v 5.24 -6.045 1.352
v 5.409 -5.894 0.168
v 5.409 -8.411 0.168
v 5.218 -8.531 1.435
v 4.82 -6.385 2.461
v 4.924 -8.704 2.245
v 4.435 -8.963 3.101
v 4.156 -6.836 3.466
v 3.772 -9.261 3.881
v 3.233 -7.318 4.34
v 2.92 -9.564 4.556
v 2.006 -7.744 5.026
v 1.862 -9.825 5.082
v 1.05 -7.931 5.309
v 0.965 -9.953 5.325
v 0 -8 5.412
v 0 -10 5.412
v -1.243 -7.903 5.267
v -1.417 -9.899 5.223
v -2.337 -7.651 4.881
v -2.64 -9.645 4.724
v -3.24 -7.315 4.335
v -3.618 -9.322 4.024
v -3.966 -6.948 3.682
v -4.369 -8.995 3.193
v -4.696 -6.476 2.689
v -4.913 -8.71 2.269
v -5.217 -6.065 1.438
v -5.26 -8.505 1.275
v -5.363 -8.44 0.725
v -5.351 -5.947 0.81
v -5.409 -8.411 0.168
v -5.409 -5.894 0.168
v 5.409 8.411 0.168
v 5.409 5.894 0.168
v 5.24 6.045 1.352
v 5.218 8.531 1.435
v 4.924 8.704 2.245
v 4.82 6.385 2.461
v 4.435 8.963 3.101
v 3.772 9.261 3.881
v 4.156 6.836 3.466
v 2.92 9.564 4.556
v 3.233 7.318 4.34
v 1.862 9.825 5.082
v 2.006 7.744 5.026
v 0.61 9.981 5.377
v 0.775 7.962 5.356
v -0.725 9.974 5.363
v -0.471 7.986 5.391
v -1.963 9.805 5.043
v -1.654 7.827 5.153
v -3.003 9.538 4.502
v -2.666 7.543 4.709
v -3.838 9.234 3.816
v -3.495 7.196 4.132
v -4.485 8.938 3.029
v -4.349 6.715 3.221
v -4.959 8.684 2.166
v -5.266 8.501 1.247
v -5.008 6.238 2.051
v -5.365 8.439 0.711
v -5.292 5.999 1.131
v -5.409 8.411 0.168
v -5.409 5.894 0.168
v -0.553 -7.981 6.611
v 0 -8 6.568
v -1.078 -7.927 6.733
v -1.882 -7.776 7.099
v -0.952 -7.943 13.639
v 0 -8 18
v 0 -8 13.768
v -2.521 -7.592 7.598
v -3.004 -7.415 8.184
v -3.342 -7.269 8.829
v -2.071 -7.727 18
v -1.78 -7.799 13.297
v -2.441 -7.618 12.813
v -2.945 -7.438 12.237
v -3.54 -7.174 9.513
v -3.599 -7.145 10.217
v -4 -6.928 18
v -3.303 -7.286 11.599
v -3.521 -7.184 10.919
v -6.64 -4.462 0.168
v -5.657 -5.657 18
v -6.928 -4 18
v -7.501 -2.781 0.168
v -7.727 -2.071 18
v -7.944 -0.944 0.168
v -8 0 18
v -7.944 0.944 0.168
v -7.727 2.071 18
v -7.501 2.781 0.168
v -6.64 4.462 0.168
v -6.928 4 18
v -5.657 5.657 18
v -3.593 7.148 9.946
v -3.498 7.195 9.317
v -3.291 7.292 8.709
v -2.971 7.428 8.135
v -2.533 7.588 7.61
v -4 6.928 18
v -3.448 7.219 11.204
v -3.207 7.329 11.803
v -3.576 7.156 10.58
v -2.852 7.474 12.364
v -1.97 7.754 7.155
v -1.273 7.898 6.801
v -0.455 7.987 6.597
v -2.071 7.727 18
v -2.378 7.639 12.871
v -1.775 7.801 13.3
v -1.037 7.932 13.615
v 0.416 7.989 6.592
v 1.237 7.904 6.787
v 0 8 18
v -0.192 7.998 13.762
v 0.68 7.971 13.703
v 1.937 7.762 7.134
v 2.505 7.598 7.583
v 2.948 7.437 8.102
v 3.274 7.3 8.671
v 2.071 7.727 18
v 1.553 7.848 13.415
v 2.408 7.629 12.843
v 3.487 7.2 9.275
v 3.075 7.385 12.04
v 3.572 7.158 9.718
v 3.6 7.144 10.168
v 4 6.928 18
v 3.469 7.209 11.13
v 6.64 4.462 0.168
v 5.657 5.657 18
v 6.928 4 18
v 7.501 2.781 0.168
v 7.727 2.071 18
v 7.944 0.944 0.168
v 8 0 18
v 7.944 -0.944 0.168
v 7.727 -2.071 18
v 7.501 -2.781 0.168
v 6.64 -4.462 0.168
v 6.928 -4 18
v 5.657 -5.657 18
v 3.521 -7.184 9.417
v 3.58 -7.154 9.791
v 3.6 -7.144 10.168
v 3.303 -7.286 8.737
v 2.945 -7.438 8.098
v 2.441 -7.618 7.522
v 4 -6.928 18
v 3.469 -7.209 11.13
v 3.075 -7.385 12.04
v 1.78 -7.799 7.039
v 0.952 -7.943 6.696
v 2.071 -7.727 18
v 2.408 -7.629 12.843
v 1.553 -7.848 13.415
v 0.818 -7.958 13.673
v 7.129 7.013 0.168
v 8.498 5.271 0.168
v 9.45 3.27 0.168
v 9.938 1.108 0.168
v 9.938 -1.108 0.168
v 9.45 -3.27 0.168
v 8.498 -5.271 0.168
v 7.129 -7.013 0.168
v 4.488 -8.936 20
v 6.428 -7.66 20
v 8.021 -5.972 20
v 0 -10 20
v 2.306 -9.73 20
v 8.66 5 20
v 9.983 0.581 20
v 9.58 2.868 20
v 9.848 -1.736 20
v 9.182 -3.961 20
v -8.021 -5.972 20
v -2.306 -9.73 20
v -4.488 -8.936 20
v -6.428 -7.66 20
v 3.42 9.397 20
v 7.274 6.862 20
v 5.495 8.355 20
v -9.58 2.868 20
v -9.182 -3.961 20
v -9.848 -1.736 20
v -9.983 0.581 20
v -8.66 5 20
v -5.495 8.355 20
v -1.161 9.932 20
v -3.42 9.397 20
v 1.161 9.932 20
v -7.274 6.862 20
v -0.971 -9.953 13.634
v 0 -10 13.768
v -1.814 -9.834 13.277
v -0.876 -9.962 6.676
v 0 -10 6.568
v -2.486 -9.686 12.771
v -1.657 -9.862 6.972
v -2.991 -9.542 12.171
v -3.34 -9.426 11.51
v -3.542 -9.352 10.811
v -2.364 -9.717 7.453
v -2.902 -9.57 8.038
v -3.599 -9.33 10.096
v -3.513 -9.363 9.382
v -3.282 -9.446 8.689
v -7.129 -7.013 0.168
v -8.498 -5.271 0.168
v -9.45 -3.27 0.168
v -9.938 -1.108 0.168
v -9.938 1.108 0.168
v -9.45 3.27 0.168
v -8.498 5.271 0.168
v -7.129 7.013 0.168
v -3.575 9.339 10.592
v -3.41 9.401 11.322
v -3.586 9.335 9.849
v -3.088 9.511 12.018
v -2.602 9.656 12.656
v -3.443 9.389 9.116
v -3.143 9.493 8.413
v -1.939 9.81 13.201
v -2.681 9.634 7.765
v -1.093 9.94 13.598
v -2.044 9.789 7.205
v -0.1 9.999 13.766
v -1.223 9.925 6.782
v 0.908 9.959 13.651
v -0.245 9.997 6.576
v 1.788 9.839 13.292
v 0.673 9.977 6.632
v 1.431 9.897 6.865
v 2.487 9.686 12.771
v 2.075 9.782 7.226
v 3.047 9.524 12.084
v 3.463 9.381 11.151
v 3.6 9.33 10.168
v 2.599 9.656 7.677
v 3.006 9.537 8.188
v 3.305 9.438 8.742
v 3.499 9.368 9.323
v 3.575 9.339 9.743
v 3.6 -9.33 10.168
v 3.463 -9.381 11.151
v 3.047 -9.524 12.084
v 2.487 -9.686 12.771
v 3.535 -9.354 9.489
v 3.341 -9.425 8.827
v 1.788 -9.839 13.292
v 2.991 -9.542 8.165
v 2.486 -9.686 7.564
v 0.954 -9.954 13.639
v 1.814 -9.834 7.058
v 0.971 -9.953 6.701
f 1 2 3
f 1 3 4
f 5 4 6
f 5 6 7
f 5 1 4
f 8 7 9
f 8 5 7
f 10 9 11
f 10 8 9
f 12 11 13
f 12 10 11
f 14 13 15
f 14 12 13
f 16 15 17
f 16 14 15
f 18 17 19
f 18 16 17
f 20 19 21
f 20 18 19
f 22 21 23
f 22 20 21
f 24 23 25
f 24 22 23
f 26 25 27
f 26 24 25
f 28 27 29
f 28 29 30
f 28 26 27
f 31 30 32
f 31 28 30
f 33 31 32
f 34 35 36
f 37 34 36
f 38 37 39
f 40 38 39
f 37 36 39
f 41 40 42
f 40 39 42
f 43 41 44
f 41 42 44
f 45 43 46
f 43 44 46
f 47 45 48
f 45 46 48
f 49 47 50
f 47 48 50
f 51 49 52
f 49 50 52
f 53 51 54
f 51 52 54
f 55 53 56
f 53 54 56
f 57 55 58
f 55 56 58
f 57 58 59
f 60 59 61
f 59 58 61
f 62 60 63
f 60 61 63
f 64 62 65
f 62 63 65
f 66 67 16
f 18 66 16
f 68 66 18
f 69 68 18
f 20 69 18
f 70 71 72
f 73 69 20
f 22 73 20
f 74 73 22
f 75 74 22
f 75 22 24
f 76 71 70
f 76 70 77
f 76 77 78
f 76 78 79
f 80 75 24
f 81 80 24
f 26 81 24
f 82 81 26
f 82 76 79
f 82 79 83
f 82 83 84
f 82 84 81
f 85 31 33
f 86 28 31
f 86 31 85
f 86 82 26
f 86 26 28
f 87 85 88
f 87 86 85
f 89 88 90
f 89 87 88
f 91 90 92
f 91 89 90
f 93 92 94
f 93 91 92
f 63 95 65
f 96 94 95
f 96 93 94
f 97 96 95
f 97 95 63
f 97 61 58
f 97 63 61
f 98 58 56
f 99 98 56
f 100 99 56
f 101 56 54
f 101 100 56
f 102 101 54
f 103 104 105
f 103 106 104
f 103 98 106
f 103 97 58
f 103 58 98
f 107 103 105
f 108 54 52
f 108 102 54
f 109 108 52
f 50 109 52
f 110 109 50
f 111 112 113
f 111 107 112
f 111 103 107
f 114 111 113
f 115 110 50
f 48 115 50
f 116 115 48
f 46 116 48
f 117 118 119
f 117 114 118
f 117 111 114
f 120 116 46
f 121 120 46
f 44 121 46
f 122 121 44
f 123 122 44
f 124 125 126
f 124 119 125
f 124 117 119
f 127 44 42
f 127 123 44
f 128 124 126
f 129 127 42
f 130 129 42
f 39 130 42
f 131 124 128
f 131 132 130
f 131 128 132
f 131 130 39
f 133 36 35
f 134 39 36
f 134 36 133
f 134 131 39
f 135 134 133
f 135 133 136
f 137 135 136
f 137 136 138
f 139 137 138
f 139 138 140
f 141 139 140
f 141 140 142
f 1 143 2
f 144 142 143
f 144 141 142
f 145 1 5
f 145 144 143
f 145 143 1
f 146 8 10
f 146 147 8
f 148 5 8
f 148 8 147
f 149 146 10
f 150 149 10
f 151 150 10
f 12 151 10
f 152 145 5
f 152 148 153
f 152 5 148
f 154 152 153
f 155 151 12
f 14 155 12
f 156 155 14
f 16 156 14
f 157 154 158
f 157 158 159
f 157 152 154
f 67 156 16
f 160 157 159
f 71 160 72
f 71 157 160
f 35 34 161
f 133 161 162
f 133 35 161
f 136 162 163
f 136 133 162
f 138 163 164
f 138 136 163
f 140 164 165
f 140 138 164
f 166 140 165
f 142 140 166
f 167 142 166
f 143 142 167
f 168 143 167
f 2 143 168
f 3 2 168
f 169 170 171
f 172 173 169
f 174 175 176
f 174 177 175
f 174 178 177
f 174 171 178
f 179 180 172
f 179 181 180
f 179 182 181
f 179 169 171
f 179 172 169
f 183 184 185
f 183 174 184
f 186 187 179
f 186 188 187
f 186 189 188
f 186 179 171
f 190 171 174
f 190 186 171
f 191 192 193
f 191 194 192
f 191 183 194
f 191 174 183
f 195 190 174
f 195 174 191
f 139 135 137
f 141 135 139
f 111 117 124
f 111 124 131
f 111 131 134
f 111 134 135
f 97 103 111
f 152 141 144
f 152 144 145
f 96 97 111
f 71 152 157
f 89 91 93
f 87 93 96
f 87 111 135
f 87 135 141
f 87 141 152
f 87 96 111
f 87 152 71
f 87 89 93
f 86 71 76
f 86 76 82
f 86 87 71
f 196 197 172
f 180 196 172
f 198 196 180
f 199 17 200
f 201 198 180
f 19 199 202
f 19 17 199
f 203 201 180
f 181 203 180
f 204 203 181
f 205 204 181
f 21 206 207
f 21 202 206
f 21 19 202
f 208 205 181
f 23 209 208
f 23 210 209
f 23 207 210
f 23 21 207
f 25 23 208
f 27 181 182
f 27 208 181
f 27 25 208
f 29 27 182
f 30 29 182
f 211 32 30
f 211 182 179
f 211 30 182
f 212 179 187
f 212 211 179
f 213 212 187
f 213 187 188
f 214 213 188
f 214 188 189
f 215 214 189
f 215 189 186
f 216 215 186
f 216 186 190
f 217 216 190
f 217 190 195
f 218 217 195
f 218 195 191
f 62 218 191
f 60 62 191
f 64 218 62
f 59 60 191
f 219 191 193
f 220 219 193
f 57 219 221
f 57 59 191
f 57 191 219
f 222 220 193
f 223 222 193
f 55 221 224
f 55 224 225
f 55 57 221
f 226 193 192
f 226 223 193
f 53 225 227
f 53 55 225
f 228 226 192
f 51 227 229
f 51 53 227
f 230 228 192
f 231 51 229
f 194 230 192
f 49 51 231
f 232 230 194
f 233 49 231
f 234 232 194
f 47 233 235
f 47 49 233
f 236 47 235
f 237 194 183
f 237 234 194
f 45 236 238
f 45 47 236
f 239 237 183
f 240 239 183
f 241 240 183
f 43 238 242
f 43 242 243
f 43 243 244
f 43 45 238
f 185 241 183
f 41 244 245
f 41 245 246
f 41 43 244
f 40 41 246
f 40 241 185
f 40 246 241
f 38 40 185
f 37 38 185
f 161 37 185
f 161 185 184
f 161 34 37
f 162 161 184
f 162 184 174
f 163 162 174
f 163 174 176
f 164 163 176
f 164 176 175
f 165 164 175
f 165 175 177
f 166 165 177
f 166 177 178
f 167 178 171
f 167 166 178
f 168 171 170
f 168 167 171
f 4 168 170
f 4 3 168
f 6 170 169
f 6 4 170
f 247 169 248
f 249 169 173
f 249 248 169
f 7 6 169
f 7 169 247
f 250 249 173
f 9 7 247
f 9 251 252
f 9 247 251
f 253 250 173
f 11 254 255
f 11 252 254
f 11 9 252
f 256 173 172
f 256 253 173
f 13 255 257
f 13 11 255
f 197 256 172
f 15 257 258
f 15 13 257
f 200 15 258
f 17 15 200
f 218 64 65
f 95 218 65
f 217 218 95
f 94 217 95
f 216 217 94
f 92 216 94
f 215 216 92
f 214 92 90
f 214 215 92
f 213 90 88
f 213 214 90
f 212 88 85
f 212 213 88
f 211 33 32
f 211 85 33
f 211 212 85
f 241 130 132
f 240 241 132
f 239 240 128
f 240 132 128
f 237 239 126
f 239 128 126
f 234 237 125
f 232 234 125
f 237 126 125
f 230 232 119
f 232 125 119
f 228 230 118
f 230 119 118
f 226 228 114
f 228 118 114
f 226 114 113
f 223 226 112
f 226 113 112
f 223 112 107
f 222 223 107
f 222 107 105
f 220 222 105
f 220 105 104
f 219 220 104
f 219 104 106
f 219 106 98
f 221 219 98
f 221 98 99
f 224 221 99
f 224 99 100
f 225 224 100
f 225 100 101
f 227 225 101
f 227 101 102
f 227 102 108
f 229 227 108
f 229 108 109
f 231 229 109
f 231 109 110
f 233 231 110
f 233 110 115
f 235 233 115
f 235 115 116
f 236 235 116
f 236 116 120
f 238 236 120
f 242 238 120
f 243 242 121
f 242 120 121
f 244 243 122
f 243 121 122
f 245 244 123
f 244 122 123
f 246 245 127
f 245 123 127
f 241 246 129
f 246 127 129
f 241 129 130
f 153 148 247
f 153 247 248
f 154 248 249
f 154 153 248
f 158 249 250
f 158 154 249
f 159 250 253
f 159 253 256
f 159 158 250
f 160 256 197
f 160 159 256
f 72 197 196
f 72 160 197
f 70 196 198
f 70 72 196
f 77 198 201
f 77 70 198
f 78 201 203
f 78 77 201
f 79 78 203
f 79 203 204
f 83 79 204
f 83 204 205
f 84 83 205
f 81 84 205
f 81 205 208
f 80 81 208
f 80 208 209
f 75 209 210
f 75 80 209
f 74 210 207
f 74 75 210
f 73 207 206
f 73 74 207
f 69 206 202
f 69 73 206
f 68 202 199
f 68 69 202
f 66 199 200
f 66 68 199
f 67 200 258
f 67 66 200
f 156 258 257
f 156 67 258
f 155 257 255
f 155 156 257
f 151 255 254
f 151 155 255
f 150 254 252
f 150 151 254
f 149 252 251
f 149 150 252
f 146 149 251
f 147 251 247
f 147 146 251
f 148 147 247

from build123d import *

# Parameters (mm, degrees)
F3_R          = 3.599766951
F4_DEPTH      = 10.001
F4_DEPTH_BACK = 10.001
F6_DEPTH      = 10.0010001
F6_DEPTH_BACK = 10.0010001


with BuildPart() as f2:
    # F0 (on Right) → F2 (revolve)
    with BuildSketch(Plane.YZ):
        Polygon((0, 18), (0, 20), (-10, 20), (-10, 0.1677852448), (-8, 0.1677852448), (-8, 18), align=None)
    revolve(axis=Axis((0, 0, 9.9367983639), (0, 0, -1)))

    # F3 (on Front) → F4 (cut, two sides)
    with BuildSketch(Plane.XZ) as f4_sk:
        with Locations((0, 10.1677852448)):
            Circle(F3_R)
    extrude(amount=-F4_DEPTH, mode=Mode.SUBTRACT)
    extrude(f4_sk.sketch, amount=F4_DEPTH_BACK, mode=Mode.SUBTRACT)

    # F5 (on Front) → F6 (cut, two sides)
    with BuildSketch(Plane.XZ) as f6_sk:
        with BuildLine():
            Line((-5.4118316221, 0), (5.4118316221, 0))
            ThreePointArc((5.4118316221, 0), (0, 5.4118316221), (-5.4118316221, 0))
        make_face()
    extrude(amount=-F6_DEPTH, mode=Mode.SUBTRACT)
    extrude(f6_sk.sketch, amount=F6_DEPTH_BACK, mode=Mode.SUBTRACT)


solid = f2.part
